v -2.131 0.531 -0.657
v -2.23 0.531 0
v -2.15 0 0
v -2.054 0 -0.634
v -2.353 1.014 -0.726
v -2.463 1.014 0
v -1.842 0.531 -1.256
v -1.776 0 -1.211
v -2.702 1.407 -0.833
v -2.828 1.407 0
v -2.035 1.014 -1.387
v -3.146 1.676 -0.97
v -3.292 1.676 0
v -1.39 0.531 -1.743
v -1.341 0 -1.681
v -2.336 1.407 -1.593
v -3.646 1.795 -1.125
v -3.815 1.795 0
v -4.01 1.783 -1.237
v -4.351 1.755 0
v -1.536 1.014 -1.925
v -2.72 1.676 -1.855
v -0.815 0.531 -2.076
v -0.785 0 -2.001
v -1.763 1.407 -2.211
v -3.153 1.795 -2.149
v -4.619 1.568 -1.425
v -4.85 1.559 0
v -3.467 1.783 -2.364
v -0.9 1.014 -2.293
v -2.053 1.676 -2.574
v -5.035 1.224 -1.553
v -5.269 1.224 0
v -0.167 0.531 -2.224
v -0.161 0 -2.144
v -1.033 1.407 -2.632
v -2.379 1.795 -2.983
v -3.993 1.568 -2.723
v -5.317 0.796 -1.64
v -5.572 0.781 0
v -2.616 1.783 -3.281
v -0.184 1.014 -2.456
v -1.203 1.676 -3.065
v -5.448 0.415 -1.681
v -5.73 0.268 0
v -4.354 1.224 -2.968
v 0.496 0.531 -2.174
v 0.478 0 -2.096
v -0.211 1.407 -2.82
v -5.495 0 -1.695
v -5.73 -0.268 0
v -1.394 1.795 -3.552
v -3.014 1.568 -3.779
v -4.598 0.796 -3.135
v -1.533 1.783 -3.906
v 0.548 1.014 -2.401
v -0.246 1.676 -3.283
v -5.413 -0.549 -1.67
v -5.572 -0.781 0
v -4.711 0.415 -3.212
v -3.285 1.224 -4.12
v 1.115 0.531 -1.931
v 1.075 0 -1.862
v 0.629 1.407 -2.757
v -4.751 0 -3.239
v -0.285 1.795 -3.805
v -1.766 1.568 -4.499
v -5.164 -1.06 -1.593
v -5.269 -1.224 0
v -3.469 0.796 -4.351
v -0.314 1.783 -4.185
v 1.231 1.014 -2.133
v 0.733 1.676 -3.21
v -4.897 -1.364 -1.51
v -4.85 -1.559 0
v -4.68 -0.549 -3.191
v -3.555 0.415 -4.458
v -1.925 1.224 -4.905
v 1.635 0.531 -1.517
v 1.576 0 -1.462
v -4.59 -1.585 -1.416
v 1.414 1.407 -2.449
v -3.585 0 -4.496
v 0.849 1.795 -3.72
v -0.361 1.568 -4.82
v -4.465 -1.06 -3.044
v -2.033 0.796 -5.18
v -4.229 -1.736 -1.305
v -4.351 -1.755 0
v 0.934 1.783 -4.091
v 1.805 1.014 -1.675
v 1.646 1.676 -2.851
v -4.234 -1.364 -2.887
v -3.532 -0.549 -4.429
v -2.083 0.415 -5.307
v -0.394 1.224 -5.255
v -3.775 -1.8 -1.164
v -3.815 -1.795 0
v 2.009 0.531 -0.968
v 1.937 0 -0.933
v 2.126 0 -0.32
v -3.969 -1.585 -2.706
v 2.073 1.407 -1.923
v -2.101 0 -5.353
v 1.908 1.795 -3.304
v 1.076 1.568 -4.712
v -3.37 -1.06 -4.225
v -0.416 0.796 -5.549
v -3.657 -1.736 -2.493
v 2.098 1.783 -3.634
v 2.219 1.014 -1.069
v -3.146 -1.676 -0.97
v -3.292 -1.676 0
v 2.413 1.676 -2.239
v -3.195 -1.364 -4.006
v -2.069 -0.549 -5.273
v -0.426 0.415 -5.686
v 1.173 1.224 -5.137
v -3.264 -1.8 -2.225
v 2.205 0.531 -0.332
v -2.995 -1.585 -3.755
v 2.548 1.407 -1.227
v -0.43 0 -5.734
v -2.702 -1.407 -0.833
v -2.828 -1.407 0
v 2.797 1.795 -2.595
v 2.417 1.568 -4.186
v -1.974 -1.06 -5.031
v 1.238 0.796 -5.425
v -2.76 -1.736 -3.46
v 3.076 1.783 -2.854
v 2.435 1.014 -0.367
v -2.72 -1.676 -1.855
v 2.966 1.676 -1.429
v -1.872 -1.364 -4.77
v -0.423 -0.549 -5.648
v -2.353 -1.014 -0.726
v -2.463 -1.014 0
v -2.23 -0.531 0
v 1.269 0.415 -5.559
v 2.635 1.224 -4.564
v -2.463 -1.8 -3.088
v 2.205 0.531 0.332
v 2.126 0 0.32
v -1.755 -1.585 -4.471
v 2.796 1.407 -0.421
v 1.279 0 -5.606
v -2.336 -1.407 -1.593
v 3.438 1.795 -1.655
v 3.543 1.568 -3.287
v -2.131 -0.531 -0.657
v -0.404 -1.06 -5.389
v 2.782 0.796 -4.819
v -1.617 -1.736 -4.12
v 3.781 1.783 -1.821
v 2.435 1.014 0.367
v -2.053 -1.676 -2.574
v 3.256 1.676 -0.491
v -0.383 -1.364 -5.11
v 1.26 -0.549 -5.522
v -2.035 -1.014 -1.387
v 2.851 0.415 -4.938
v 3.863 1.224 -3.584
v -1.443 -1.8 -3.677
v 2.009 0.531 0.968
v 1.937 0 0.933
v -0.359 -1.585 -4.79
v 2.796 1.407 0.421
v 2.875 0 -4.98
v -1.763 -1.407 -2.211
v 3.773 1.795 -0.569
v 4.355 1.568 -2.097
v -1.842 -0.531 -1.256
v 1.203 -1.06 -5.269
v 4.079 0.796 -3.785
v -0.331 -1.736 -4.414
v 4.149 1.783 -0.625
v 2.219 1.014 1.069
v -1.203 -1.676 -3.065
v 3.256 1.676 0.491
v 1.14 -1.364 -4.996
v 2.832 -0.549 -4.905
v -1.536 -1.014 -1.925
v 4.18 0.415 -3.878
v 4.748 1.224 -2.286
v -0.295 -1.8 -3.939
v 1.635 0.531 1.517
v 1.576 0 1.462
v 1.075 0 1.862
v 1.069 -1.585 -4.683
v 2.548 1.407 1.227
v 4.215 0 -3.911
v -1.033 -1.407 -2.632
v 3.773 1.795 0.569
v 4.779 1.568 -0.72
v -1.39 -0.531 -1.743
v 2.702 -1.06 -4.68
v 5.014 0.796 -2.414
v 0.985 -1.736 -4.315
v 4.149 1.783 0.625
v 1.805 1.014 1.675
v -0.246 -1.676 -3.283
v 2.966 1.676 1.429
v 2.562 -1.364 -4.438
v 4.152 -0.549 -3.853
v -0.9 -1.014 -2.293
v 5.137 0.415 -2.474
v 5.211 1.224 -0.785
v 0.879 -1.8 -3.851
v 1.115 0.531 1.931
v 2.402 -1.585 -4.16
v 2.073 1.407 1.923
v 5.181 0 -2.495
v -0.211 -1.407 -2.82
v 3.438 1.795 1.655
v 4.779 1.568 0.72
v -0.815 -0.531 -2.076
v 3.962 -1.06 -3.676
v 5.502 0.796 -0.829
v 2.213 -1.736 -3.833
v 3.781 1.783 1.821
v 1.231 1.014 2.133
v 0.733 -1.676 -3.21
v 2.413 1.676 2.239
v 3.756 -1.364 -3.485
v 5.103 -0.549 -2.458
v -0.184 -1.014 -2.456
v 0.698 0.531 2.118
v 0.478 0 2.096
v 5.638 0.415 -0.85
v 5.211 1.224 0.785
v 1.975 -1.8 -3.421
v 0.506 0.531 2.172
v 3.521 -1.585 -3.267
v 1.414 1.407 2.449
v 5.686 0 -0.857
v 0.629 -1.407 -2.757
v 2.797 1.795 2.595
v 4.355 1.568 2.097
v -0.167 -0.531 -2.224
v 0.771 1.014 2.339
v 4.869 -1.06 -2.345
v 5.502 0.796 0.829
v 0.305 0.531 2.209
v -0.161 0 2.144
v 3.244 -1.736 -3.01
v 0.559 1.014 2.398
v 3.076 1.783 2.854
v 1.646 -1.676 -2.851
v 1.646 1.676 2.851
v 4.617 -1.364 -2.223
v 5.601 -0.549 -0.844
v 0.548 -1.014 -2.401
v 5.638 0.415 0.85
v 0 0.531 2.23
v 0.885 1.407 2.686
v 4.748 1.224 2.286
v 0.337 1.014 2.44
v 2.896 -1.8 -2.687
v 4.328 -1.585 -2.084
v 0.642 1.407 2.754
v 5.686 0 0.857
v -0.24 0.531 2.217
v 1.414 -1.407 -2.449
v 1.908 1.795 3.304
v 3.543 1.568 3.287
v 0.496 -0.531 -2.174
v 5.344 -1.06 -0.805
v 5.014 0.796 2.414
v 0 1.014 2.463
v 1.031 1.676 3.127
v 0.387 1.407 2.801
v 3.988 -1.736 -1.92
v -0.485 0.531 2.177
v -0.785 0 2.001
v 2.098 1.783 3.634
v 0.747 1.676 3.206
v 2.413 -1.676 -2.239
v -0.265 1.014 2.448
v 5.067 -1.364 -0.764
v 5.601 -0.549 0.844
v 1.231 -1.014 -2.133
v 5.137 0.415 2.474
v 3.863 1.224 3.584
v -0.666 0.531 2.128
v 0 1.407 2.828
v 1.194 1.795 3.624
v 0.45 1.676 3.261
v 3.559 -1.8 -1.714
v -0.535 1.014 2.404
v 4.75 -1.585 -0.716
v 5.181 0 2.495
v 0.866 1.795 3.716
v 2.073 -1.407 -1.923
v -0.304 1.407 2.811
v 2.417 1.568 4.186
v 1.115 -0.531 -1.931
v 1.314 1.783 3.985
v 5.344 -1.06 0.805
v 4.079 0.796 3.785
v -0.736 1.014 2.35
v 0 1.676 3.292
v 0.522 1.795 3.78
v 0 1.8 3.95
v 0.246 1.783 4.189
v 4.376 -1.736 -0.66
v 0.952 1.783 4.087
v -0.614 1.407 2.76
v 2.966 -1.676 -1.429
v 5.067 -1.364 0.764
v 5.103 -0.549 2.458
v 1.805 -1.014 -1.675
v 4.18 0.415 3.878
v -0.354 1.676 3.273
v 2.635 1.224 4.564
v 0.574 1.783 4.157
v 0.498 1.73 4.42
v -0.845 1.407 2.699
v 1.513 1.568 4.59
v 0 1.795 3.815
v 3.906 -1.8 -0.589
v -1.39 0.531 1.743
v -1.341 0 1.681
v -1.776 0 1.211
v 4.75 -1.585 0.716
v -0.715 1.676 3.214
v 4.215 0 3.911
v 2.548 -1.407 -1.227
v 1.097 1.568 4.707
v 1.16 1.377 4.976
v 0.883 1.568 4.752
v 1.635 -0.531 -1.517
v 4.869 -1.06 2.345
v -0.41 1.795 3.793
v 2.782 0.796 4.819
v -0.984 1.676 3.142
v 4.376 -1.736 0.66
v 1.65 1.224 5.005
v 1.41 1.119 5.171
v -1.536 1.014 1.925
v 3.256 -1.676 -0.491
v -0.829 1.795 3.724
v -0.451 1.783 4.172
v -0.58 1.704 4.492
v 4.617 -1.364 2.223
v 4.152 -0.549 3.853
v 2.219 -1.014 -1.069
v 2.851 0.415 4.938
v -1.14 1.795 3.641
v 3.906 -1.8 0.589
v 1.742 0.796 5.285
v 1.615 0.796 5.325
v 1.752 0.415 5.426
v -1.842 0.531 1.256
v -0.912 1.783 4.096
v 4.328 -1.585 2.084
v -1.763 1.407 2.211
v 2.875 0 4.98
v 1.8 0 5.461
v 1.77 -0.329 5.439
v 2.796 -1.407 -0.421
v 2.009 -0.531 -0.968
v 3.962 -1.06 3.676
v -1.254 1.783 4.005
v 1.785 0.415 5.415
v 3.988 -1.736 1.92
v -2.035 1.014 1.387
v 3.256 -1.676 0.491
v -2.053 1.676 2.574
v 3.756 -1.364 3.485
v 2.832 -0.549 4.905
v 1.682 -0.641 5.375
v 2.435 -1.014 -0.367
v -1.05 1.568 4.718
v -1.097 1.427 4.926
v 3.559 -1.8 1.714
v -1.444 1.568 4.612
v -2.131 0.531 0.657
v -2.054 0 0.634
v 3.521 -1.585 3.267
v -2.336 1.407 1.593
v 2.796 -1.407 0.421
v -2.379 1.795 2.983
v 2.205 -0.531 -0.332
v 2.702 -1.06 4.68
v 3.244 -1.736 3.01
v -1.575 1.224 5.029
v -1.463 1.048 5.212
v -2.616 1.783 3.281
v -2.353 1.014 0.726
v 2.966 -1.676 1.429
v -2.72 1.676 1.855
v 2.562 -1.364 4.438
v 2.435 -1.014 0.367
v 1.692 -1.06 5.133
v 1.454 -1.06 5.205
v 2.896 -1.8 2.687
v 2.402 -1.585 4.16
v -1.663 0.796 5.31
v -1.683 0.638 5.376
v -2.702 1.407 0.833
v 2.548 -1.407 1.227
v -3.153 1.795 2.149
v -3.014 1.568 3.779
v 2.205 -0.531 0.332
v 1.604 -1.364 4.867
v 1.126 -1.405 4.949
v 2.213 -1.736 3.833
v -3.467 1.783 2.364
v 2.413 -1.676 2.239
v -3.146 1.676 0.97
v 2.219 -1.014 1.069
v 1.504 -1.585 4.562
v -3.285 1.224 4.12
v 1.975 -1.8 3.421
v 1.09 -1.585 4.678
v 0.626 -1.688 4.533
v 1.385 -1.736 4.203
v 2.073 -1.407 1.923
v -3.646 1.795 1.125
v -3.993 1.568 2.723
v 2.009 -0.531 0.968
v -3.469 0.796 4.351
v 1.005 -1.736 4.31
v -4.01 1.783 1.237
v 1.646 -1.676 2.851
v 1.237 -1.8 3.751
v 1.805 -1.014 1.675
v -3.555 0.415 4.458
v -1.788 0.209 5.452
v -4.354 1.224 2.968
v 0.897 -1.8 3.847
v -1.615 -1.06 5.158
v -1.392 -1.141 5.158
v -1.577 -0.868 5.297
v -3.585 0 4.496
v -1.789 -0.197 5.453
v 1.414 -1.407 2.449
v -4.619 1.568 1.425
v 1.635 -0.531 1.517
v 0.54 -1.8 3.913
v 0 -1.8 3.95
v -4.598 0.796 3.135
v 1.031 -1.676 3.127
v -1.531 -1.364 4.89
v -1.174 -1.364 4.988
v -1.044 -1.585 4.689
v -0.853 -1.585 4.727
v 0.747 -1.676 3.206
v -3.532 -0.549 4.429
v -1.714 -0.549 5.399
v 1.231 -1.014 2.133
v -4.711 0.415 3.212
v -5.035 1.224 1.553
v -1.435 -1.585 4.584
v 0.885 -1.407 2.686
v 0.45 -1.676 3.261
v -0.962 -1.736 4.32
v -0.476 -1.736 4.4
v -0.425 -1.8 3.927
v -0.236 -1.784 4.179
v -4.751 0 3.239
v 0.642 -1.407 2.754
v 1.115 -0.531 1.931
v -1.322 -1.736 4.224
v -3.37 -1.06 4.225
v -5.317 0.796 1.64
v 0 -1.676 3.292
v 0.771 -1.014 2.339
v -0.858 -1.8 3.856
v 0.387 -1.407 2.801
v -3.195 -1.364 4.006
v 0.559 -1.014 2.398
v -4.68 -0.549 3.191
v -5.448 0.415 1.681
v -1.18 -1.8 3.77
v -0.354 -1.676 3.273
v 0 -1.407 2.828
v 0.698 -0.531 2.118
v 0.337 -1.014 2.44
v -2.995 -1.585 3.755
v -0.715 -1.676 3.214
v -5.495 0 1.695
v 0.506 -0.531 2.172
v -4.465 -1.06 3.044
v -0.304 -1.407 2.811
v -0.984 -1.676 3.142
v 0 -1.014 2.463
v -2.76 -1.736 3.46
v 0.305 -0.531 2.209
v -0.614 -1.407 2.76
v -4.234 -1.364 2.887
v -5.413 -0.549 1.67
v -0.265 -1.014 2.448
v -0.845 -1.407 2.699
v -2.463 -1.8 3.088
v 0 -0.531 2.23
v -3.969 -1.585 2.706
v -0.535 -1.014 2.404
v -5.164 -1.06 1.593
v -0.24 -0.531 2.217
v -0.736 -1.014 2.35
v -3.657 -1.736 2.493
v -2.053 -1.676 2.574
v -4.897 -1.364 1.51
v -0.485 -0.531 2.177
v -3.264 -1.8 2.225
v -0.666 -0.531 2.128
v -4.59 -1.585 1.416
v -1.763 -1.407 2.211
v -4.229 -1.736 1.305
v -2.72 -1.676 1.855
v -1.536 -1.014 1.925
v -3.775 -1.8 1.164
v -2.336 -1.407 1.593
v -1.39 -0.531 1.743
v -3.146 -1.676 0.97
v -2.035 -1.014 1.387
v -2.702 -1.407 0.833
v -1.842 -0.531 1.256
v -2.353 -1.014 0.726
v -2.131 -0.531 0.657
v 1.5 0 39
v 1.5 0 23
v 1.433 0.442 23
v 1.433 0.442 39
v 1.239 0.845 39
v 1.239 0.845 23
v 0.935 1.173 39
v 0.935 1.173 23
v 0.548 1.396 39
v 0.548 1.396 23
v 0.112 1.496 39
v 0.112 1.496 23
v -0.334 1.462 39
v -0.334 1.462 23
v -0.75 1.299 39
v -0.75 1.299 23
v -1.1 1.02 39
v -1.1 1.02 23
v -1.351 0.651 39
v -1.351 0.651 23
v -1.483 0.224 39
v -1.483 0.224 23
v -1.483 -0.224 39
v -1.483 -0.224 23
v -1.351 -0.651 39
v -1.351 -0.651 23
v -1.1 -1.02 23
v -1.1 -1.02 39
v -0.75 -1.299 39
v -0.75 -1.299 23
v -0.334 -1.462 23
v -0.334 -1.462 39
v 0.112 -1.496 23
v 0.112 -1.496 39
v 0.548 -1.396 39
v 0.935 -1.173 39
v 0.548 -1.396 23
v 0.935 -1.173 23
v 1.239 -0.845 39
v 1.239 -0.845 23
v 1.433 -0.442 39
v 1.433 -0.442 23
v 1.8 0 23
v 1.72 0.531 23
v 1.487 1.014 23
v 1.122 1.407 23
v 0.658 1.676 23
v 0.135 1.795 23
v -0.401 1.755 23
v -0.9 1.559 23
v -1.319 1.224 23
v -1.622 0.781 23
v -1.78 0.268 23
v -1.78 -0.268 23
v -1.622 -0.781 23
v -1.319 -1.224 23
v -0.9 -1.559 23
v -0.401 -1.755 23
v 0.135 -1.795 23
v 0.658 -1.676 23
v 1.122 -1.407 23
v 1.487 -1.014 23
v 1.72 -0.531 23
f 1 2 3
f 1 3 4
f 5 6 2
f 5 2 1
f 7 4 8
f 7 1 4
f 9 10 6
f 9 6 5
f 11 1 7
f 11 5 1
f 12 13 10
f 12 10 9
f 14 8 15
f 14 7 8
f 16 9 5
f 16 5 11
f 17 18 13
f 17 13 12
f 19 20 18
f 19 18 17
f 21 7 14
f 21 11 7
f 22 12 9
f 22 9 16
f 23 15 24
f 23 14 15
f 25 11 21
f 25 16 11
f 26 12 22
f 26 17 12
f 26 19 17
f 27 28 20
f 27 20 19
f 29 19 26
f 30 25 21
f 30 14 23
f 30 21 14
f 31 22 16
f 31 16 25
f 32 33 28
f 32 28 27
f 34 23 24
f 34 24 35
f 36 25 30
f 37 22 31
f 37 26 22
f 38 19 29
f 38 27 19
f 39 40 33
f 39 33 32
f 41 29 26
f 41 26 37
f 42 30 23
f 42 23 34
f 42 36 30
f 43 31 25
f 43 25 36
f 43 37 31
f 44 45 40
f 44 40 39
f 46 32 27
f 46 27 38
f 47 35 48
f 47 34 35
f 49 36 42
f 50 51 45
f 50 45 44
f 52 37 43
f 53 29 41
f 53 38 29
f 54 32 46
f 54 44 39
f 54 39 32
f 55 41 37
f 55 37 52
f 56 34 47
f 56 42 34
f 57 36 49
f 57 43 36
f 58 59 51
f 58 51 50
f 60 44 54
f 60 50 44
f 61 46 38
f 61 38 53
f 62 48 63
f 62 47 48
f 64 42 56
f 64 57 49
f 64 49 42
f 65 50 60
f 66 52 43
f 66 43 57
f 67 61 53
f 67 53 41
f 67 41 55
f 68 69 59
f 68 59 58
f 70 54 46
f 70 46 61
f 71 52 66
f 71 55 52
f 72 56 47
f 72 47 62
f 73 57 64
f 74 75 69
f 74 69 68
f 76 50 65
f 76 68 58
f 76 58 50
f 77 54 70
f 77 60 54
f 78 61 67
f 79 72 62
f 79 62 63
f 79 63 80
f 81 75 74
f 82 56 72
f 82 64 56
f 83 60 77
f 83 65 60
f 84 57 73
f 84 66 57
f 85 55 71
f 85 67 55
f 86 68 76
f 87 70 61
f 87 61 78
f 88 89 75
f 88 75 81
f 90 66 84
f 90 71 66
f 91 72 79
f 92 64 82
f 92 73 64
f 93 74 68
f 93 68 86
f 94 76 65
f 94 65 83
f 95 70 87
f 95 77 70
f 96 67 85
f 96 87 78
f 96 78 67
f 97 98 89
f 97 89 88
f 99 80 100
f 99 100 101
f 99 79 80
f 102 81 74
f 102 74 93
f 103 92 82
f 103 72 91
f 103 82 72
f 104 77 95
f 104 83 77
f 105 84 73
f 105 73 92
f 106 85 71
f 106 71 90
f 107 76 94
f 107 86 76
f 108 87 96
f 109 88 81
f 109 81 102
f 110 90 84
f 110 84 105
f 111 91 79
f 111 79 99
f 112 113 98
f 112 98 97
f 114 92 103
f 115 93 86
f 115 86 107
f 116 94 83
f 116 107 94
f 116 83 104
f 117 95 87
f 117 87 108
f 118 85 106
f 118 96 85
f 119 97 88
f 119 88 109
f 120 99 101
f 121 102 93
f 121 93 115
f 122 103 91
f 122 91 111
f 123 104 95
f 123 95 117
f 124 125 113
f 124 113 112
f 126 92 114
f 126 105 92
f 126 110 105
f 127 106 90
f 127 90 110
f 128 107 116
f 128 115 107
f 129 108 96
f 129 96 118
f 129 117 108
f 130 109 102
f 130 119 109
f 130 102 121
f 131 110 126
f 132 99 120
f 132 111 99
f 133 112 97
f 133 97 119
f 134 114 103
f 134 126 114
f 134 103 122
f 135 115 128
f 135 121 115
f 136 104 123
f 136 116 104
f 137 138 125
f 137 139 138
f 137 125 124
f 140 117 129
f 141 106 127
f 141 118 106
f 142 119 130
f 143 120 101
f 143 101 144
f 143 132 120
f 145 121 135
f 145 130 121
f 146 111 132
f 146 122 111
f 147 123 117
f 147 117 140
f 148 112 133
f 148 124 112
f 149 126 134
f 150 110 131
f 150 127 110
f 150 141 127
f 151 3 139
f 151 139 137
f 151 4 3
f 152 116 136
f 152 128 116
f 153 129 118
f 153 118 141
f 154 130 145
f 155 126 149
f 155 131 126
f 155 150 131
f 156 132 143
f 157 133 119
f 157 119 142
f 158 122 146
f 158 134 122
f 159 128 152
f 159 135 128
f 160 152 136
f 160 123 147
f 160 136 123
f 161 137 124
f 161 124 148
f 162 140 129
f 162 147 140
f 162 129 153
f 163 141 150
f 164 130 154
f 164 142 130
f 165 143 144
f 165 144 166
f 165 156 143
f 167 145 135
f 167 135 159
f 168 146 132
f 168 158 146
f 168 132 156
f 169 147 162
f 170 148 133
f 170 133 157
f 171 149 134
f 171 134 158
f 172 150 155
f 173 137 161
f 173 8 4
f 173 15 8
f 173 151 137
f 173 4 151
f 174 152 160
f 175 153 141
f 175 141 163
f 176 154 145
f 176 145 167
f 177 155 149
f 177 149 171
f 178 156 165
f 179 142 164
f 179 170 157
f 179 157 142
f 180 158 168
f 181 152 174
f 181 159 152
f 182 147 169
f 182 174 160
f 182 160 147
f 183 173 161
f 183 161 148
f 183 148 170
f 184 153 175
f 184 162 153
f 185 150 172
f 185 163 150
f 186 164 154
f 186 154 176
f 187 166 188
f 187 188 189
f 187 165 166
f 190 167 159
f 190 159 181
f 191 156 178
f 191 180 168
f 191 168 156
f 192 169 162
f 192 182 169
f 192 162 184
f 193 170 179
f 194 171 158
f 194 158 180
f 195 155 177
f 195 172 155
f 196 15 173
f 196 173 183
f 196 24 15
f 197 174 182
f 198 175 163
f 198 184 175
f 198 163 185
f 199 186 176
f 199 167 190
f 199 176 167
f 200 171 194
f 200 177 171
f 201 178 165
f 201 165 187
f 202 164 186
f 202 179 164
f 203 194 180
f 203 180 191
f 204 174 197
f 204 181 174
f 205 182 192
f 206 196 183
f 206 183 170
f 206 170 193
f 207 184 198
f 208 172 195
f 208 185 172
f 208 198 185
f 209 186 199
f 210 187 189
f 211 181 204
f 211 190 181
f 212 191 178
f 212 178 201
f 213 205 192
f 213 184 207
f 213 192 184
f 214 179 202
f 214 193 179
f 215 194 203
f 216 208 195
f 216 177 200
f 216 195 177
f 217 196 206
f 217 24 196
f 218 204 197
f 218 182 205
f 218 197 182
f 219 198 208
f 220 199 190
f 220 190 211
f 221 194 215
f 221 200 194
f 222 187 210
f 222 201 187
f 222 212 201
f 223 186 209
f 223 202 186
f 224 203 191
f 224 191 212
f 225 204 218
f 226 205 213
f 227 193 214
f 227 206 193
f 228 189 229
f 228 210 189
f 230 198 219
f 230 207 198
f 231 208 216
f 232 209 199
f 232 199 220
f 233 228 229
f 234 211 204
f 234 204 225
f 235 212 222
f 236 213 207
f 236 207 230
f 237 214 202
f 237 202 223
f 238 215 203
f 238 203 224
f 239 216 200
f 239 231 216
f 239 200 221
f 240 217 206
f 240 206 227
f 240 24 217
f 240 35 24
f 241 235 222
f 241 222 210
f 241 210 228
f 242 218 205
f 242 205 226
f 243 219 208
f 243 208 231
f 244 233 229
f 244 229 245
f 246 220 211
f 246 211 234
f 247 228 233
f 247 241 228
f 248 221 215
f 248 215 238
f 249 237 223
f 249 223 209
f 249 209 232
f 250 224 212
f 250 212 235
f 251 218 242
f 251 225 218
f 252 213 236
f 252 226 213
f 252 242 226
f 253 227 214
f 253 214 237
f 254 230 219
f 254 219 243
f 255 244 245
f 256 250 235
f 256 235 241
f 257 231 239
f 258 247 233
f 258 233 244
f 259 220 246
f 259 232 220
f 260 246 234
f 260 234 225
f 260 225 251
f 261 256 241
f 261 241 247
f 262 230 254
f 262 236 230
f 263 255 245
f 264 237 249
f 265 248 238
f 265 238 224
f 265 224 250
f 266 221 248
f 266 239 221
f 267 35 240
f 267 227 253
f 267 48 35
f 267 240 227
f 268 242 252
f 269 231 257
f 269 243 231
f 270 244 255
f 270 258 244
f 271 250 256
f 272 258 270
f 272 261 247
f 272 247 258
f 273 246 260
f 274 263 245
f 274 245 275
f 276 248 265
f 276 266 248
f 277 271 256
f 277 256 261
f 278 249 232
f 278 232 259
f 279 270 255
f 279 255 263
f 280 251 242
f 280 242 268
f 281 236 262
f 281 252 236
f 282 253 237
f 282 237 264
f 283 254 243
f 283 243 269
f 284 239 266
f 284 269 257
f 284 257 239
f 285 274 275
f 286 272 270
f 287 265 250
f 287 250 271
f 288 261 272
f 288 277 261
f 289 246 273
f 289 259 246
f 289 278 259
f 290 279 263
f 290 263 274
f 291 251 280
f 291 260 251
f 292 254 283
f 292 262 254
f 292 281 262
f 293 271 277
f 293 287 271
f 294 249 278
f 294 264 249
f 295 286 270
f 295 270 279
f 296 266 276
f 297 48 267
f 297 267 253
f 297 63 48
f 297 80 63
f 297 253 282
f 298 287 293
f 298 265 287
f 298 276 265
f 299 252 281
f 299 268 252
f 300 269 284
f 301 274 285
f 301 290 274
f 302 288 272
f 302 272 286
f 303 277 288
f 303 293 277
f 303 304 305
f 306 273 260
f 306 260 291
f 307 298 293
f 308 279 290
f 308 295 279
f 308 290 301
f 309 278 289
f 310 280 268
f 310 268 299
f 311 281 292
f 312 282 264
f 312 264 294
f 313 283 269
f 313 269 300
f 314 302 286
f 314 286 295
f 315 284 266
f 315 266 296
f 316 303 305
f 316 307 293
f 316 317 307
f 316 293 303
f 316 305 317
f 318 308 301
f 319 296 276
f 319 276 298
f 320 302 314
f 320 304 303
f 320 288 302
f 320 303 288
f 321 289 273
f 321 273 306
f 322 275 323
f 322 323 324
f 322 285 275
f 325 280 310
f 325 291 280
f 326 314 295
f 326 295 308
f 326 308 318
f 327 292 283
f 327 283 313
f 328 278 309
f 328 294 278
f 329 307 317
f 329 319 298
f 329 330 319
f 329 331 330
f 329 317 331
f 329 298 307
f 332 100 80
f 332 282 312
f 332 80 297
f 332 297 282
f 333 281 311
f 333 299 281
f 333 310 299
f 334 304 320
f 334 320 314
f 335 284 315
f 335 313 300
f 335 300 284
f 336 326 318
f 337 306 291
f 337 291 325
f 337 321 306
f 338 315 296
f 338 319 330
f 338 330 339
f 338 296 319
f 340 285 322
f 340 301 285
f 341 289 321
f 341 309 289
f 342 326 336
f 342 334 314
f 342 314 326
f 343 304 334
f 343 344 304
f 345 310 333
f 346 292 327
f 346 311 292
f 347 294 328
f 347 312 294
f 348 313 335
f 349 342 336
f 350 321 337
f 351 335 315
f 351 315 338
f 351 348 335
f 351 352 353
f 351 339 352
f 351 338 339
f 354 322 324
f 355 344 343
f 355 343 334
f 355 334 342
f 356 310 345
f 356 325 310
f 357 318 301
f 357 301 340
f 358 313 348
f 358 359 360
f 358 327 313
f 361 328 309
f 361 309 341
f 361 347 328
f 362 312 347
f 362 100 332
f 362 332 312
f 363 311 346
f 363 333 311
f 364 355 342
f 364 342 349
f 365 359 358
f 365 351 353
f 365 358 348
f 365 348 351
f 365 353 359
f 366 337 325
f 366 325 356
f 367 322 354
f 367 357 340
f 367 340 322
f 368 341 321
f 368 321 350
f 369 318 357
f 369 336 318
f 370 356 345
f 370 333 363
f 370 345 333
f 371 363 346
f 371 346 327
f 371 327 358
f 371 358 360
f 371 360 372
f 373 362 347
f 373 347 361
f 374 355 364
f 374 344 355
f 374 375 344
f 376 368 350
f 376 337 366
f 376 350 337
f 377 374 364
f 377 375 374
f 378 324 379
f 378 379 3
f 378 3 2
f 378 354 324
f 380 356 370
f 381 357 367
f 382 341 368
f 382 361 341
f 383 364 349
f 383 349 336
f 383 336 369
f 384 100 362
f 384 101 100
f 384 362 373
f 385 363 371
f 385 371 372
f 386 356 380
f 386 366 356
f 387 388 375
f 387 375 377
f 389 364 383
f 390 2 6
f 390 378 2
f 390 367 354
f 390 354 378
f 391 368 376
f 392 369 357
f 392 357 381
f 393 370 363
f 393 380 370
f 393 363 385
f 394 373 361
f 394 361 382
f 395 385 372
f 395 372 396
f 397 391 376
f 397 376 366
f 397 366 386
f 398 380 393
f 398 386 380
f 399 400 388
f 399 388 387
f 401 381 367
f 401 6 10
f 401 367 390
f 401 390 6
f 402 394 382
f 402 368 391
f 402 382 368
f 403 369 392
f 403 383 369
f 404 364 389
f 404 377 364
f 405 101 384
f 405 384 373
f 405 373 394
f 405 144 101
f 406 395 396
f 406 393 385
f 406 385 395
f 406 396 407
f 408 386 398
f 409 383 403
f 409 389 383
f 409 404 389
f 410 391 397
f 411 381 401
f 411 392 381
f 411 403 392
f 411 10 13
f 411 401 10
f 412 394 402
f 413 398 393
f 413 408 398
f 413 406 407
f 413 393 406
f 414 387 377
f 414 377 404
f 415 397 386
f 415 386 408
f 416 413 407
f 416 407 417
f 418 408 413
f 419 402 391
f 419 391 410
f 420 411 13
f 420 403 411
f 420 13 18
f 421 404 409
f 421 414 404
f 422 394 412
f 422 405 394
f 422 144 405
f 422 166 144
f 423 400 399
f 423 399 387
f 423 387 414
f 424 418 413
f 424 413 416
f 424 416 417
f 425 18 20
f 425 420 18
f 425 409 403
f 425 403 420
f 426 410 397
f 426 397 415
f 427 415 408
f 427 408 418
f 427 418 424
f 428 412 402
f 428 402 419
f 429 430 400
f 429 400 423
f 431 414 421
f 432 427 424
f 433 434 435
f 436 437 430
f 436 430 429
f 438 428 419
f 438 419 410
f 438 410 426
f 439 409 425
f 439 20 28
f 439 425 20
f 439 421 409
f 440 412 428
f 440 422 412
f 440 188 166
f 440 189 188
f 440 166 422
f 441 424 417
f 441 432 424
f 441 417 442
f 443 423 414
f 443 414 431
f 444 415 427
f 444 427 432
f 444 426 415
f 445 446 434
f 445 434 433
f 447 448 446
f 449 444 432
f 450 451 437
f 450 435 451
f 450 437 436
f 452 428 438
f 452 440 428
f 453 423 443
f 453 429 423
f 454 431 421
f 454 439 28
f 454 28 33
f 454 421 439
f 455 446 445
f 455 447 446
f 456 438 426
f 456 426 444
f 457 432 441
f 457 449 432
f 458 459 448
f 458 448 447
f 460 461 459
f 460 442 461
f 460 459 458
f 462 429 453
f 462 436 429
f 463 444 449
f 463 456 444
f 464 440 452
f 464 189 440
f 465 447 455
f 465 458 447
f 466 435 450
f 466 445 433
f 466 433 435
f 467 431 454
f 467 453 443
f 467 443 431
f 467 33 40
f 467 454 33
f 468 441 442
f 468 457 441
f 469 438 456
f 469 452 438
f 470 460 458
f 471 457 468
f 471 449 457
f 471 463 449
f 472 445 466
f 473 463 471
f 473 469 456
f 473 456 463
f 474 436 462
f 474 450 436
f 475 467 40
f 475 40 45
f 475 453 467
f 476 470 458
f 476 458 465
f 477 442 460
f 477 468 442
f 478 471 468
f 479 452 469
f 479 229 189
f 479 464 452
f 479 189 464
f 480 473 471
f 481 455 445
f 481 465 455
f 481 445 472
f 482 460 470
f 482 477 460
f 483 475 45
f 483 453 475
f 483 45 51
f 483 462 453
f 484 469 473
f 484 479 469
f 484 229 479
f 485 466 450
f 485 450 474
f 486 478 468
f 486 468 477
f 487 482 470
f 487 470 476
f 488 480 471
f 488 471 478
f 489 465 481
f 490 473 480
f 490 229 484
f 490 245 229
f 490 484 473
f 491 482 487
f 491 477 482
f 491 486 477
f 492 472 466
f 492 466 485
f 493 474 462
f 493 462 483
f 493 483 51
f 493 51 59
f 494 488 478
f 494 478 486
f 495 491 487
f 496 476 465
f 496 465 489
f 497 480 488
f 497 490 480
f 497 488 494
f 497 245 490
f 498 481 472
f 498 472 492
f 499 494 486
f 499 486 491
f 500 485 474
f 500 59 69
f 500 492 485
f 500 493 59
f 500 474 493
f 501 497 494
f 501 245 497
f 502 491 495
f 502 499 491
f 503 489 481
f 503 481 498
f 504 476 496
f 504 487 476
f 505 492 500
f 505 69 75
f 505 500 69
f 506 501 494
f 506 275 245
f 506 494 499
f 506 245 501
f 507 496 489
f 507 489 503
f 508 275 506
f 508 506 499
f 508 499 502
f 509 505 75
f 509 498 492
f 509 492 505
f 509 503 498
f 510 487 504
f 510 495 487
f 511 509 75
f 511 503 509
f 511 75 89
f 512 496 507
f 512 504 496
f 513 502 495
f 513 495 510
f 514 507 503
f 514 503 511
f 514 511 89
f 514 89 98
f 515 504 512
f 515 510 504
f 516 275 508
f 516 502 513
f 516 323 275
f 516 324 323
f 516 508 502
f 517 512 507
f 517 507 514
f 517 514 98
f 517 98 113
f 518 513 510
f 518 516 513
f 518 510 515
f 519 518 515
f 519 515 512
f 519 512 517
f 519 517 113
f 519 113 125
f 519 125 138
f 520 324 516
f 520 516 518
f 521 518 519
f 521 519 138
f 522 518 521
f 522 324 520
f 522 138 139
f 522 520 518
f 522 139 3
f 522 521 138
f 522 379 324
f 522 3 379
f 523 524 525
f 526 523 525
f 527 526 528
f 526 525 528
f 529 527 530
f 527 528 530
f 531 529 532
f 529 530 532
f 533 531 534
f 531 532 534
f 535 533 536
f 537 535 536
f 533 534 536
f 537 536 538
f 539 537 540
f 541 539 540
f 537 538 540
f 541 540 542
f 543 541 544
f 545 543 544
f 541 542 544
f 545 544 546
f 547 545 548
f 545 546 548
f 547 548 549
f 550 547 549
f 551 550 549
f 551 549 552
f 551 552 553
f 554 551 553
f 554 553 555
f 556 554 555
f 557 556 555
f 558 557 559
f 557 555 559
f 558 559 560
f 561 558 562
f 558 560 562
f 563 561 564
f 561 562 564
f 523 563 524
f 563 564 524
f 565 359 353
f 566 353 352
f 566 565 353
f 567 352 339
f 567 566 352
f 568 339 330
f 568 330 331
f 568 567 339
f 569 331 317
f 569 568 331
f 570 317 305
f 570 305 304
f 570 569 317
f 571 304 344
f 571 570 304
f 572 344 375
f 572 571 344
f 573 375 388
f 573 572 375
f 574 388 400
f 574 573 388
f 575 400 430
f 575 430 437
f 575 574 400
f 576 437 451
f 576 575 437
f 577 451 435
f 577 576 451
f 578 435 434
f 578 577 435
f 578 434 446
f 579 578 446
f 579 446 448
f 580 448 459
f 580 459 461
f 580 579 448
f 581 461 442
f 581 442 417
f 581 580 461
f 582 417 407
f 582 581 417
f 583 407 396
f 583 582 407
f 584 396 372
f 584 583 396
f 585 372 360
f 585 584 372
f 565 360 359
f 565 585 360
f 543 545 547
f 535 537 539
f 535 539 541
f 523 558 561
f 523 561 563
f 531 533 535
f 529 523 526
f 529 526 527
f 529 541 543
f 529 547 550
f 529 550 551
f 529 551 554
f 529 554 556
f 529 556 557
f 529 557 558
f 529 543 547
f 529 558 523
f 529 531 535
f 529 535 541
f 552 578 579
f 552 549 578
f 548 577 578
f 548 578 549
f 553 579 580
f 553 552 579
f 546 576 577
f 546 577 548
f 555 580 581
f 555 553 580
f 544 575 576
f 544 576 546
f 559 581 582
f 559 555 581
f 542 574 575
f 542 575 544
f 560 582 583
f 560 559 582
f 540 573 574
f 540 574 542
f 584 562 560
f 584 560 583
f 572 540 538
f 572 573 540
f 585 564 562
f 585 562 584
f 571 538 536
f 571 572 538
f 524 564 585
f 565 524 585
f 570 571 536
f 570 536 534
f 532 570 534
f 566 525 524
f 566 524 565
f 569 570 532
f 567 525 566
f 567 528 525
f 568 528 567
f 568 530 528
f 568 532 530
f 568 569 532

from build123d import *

# Parameters (mm, degrees)
SKETCH_1_R      = 1.8
EXTRUDE_1_REACH = 30.75
SKETCH_2_R      = 1.8
SKETCH_3_R      = 1.5
EXTRUDE_2_DEPTH = 16


with BuildPart() as part:
    # 草图1 → 旋转1 (revolve)
    with BuildSketch(Plane.XY):
        with Locations((-3.95, 0)):
            Circle(SKETCH_1_R)
    revolve(axis=Axis((0, 9.659818304, 0), (0, -1, 0)))

    # 草图2 → 凸台-拉伸1 (add, up to next)
    with BuildSketch(Plane.XY.offset(23), mode=Mode.PRIVATE) as extrude_1_sk1:
        Circle(SKETCH_2_R)
    extrude_1_tool1 = extrude(extrude_1_sk1.sketch, amount=-EXTRUDE_1_REACH, mode=Mode.PRIVATE) - part.part
    add(extrude_1_tool1.solids().sort_by_distance((0, 0, 23))[0])

    # 草图3 → 凸台-拉伸2 (add)
    with BuildSketch(Plane.XY.offset(23)):
        Circle(SKETCH_3_R)
    extrude(amount=EXTRUDE_2_DEPTH)


solid = part.part
